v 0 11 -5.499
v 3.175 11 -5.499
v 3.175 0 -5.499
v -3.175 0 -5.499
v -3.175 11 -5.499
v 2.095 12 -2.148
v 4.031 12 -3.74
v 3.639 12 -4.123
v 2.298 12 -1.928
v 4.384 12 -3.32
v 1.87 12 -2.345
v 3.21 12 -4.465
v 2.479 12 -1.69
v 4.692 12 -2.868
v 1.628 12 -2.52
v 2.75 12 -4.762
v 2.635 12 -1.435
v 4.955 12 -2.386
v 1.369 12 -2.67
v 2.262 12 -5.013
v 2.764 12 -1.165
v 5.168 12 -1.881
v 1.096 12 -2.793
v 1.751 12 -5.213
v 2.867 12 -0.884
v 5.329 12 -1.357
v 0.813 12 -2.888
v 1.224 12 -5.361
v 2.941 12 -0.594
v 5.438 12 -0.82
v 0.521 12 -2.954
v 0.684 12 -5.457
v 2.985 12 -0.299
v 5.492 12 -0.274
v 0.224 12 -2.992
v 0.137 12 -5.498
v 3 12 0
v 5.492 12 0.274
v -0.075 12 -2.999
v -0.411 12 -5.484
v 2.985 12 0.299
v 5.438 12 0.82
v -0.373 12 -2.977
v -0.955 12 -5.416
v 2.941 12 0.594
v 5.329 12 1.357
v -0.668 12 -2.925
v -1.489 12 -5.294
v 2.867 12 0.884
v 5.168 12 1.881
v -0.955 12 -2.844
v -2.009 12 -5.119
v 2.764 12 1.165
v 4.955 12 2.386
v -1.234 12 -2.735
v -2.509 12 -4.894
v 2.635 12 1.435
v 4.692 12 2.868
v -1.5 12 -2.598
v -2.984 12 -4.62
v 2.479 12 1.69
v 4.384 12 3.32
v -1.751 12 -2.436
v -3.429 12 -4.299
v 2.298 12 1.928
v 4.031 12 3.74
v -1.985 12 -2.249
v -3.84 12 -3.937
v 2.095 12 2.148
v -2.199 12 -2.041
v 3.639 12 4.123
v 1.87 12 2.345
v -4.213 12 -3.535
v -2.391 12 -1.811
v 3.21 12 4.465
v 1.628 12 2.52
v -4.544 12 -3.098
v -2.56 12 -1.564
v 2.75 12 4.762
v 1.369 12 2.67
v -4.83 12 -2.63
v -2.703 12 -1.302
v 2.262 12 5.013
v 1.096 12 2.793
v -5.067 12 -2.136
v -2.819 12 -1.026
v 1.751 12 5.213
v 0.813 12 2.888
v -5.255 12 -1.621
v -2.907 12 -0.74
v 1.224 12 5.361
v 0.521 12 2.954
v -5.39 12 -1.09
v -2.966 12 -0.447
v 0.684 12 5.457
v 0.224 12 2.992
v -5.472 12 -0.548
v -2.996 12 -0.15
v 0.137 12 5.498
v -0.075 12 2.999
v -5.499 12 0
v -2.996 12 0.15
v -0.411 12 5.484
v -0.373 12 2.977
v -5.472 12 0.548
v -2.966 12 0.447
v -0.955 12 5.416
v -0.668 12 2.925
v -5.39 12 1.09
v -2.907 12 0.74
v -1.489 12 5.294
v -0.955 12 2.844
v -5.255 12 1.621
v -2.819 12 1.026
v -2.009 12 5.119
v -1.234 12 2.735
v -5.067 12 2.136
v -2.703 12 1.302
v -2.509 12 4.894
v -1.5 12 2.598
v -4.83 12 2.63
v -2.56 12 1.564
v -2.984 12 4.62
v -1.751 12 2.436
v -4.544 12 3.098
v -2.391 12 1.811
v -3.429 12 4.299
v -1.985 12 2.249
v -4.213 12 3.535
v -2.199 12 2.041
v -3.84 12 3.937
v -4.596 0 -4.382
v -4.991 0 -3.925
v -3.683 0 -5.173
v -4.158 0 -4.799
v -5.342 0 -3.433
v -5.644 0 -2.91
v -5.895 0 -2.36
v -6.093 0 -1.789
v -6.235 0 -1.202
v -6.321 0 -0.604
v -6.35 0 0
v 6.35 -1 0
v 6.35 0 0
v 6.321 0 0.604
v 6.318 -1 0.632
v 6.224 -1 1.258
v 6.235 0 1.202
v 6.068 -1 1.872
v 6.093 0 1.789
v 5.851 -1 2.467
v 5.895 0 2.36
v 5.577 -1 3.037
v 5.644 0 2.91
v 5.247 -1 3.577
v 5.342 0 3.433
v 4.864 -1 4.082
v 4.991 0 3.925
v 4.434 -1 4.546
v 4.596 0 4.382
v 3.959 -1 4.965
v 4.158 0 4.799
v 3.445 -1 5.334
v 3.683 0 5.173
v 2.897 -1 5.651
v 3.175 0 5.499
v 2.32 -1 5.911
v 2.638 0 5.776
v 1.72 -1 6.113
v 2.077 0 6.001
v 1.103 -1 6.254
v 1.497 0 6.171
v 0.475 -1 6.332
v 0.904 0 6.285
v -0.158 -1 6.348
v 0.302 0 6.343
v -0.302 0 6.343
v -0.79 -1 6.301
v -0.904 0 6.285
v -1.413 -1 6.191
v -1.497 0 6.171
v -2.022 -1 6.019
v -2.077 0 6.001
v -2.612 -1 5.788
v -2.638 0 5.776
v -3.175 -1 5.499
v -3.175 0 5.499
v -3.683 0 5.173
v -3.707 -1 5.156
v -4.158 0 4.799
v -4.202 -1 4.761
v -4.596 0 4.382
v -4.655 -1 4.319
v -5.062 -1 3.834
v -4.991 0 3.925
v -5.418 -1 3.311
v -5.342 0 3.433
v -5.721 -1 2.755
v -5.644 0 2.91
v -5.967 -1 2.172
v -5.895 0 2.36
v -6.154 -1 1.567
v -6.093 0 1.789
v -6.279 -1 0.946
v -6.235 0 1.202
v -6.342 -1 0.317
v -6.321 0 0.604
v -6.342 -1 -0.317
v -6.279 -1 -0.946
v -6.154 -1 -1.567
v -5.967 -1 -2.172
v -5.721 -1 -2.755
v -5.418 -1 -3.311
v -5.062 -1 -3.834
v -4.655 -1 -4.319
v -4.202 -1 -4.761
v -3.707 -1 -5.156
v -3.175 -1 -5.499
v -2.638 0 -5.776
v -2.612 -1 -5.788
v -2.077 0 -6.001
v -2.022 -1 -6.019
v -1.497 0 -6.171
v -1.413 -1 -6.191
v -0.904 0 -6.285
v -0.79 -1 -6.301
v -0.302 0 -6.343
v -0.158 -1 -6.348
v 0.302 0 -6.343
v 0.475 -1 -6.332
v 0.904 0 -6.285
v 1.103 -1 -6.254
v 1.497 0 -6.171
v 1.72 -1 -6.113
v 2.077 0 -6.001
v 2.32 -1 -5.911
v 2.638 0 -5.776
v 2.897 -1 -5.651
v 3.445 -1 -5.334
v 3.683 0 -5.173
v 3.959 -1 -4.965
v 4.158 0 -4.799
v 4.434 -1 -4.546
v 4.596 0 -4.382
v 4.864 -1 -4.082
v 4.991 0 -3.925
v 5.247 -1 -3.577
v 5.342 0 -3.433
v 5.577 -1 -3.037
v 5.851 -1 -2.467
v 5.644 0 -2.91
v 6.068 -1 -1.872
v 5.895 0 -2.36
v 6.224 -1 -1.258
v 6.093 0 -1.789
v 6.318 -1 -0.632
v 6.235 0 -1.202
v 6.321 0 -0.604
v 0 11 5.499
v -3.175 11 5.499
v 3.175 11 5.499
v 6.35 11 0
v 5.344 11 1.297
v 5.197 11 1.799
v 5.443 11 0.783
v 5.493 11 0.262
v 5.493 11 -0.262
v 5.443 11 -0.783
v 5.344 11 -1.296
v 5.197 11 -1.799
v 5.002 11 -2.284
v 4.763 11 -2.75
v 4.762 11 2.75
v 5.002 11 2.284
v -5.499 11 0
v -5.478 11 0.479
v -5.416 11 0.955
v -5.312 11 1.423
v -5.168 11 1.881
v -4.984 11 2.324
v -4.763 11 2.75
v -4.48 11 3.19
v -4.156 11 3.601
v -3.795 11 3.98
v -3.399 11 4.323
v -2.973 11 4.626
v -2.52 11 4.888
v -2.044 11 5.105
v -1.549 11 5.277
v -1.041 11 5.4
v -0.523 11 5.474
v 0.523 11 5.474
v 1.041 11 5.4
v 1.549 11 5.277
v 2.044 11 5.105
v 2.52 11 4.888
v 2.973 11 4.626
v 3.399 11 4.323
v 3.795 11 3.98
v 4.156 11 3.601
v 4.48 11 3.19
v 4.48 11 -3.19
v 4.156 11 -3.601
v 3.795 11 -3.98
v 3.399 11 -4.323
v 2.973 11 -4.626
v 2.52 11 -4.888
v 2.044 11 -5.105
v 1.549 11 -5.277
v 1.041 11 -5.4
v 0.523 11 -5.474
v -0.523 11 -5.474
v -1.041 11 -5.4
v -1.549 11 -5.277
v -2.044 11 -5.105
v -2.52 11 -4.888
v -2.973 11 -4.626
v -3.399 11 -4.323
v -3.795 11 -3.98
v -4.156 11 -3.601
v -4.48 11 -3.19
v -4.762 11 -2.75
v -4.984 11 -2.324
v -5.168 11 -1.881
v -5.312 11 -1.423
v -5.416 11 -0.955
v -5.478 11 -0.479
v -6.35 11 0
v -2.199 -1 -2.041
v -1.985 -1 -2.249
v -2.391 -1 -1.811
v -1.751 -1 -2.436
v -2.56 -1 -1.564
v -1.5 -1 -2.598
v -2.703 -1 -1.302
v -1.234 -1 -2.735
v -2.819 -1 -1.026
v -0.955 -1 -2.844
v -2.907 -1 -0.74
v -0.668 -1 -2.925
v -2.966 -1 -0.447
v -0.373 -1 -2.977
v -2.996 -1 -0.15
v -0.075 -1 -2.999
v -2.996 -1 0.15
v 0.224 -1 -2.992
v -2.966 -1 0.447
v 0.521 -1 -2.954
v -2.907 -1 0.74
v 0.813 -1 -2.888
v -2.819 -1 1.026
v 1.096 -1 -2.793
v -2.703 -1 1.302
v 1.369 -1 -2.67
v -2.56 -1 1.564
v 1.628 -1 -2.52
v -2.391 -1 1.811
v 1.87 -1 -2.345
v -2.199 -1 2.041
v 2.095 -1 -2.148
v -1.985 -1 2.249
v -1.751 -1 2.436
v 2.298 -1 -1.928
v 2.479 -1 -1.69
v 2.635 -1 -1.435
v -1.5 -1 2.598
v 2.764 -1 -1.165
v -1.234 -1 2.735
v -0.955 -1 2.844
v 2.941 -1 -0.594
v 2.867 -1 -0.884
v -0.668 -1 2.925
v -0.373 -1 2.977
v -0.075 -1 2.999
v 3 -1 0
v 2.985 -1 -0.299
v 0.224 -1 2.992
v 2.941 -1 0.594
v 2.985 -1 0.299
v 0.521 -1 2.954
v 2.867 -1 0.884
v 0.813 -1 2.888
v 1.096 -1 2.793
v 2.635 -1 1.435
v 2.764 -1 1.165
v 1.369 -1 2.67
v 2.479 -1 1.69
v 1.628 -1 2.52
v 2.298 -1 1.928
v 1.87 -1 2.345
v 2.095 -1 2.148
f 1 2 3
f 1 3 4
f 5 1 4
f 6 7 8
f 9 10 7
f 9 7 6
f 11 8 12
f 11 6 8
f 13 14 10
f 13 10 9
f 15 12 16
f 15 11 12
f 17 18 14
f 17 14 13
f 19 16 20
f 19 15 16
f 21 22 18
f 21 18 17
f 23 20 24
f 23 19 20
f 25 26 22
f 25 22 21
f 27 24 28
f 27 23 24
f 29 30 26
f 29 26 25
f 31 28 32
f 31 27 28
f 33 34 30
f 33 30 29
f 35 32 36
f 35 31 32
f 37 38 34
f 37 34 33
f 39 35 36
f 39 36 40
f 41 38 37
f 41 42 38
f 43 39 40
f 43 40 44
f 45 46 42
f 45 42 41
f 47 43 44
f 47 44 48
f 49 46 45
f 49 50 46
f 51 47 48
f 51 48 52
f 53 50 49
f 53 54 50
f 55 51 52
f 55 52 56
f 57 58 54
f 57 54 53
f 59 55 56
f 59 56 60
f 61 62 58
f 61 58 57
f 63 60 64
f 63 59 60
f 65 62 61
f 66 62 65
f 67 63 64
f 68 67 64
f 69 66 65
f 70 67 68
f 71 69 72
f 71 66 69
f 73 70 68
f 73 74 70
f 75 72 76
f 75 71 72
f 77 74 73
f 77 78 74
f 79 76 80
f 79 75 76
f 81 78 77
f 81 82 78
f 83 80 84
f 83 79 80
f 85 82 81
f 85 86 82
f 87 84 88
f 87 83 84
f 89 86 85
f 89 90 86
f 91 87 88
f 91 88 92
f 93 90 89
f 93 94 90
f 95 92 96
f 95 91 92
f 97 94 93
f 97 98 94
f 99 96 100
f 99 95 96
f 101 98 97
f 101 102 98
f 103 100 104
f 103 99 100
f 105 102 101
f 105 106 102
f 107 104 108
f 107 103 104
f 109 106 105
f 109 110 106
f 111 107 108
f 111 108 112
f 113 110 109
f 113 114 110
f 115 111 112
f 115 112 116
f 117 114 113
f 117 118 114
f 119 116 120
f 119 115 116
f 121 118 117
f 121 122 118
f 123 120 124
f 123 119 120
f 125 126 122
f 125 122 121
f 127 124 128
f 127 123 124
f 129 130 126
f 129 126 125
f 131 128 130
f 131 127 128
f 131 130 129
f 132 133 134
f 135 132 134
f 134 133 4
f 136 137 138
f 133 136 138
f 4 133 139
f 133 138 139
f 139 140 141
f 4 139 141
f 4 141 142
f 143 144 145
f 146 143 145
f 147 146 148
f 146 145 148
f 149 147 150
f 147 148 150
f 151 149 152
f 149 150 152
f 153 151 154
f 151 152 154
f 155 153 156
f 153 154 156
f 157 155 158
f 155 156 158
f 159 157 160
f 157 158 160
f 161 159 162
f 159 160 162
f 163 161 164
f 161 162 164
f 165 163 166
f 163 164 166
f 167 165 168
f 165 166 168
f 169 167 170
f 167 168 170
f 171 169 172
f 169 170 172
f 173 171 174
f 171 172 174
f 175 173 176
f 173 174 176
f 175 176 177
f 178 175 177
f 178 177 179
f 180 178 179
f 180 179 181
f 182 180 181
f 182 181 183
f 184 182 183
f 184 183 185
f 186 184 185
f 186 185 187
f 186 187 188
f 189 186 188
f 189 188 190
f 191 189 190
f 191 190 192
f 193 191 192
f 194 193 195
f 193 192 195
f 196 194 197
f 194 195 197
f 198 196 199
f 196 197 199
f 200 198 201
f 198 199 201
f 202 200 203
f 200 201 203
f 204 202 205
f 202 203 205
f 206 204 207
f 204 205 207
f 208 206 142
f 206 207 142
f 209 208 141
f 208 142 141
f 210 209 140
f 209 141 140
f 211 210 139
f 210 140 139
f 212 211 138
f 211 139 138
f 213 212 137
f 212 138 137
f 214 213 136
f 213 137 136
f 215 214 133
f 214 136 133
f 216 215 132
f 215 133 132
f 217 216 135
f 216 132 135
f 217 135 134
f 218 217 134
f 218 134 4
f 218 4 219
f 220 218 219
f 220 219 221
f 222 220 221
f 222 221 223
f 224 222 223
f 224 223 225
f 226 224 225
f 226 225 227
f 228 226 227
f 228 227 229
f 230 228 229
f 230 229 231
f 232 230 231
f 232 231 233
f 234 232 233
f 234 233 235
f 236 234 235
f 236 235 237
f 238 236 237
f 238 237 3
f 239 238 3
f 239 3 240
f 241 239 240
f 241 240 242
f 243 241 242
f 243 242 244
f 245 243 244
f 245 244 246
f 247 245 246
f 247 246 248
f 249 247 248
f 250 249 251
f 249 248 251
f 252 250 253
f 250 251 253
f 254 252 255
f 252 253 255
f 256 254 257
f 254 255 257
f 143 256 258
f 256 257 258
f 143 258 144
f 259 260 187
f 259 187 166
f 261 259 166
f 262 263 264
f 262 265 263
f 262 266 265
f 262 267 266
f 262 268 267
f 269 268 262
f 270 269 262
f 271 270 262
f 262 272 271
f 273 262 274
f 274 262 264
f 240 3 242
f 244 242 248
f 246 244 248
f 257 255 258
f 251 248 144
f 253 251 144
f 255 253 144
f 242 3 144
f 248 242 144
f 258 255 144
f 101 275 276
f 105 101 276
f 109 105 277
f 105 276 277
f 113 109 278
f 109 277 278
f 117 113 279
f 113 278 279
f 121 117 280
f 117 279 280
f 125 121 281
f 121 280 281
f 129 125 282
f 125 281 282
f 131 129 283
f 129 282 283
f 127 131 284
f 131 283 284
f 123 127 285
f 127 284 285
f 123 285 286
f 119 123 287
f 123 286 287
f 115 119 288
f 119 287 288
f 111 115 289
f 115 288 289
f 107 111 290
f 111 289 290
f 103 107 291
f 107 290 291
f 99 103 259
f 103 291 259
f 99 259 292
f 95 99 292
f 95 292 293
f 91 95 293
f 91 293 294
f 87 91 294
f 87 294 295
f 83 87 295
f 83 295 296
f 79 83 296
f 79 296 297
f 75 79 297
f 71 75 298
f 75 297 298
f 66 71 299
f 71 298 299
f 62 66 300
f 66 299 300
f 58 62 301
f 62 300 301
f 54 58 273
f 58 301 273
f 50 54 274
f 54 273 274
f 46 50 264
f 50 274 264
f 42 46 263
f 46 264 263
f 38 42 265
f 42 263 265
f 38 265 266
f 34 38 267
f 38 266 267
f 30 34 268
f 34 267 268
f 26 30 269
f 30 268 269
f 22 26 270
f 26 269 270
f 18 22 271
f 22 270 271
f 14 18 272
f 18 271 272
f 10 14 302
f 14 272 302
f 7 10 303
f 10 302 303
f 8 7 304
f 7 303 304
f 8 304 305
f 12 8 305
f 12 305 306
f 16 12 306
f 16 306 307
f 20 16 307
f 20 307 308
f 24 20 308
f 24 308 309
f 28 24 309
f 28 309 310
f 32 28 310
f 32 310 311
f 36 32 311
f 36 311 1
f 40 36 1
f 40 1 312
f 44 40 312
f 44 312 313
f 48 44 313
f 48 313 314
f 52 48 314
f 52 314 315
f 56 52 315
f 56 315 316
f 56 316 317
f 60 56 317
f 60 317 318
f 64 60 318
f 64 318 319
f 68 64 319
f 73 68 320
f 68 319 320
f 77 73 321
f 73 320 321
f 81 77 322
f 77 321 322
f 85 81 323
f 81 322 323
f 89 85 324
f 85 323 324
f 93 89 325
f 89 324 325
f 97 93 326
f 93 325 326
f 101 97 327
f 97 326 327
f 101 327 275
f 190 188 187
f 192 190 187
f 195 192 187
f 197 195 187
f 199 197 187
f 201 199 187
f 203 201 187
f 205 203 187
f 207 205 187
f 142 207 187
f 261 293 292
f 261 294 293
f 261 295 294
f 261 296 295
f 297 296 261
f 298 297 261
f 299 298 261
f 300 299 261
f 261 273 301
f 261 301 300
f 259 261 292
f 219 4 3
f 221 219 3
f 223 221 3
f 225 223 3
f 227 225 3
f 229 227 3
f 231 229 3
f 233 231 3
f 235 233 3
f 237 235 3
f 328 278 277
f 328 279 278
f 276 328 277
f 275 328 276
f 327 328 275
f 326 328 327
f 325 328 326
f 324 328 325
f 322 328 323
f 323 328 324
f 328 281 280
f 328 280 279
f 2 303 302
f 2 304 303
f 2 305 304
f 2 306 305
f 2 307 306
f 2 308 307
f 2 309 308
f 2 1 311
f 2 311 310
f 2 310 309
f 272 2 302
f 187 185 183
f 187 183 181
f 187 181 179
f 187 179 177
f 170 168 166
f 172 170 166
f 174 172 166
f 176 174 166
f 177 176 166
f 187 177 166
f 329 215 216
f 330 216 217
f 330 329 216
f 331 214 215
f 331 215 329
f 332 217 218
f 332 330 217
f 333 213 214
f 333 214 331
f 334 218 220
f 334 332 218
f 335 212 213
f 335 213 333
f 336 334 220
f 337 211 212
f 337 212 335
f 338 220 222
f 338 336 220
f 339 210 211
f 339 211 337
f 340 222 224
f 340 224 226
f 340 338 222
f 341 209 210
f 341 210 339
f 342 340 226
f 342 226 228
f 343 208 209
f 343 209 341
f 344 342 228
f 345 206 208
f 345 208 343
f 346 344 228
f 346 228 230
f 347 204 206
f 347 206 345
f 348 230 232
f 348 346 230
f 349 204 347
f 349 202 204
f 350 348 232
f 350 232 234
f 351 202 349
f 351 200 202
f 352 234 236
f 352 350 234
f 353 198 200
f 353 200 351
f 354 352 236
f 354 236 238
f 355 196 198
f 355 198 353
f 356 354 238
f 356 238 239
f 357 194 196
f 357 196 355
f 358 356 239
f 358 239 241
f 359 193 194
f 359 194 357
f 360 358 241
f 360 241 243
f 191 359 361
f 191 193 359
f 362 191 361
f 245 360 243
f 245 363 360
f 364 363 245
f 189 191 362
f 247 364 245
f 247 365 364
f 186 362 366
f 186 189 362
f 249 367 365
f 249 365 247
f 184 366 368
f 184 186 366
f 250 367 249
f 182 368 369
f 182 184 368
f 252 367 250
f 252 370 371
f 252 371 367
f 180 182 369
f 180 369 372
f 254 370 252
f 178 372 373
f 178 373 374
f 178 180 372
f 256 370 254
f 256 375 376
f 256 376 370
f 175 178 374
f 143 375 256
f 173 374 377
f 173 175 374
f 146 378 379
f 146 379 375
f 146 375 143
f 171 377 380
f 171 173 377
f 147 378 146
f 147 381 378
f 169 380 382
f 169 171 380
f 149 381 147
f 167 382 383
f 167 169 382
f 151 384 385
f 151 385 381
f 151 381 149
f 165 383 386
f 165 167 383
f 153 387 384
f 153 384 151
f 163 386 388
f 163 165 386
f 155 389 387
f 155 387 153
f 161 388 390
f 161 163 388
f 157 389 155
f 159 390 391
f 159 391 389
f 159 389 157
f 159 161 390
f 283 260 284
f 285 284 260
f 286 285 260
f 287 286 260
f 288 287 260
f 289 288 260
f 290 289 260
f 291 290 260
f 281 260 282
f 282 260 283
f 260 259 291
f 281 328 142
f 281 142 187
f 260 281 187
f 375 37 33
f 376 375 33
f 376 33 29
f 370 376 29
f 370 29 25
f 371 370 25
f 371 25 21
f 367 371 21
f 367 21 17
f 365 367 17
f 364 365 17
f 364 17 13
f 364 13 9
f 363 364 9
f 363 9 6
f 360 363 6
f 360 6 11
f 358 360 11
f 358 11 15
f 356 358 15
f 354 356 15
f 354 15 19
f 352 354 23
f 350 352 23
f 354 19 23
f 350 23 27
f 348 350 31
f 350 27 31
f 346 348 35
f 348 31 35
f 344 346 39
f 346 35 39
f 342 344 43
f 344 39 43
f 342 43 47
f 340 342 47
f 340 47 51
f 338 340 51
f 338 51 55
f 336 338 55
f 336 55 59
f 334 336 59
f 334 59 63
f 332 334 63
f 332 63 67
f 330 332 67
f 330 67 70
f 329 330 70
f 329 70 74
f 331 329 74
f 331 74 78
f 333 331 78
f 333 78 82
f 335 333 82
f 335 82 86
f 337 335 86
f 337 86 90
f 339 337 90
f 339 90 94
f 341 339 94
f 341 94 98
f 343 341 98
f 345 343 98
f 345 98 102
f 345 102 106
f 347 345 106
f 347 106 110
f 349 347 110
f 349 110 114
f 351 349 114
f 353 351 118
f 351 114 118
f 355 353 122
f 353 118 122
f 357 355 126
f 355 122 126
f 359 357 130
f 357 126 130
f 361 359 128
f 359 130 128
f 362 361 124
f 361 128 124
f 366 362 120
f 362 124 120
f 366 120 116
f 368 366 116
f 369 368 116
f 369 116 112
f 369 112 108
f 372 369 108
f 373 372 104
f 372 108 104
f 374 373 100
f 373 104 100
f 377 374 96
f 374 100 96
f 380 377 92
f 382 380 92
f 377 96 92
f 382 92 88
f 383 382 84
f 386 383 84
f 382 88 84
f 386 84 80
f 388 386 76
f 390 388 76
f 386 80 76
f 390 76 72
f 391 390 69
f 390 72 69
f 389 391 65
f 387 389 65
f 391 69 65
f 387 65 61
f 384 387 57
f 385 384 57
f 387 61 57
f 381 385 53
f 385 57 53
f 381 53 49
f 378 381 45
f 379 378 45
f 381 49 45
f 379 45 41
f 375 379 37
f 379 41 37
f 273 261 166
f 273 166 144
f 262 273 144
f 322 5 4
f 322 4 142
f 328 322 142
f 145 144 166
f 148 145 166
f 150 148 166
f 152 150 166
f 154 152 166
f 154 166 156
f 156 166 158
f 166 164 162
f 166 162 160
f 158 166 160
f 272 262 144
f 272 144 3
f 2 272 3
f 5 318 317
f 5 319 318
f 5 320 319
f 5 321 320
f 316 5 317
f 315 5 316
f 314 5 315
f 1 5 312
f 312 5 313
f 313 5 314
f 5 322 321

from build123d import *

# Parameters (mm, degrees)
ESTRUSIONE_ESTRUSIONE1_DEPTH = 11
SCHIZZO2_R                   = 6.35
ESTRUSIONE_ESTRUSIONE2_DEPTH = 1
SCHIZZO3_R                   = 5.499261314
ESTRUSIONE_ESTRUSIONE3_DEPTH = 1
FORO_0_6_0_6_1_D             = 6
FORO_0_6_0_6_1_DEPTH         = 13


with BuildPart() as part:
    # Schizzo1 → Estrusione-Estrusione1 (new body)
    with BuildSketch(Plane(origin=(0, 11, 0), x_dir=(1, 0, 0), z_dir=(0, 1, 0))):
        Polygon((-3.175, 5.499261314), (-6.35, 0), (-3.175, -5.499261314), (3.175, -5.499261314), (6.35, 0), (3.175, 5.499261314), align=None)
    extrude(amount=-ESTRUSIONE_ESTRUSIONE1_DEPTH)

    # Schizzo2 → Estrusione-Estrusione2 (add)
    with BuildSketch(Plane.XZ):
        Circle(SCHIZZO2_R)
    extrude(amount=ESTRUSIONE_ESTRUSIONE2_DEPTH)

    # Schizzo3 → Estrusione-Estrusione3 (add)
    with BuildSketch(Plane(origin=(0, 11, 0), x_dir=(-1, 0, 0), z_dir=(0, 1, 0))):
        Circle(SCHIZZO3_R)
    extrude(amount=ESTRUSIONE_ESTRUSIONE3_DEPTH)

    # Foro Ø0.6 (0.6)-1
    with Locations(Plane(origin=(0, -1, 0), x_dir=(-1, 0, 0), z_dir=(0, -1, 0))):
        with Locations((0, 0)):
            Hole(FORO_0_6_0_6_1_D / 2, depth=FORO_0_6_0_6_1_DEPTH)


solid = part.part
